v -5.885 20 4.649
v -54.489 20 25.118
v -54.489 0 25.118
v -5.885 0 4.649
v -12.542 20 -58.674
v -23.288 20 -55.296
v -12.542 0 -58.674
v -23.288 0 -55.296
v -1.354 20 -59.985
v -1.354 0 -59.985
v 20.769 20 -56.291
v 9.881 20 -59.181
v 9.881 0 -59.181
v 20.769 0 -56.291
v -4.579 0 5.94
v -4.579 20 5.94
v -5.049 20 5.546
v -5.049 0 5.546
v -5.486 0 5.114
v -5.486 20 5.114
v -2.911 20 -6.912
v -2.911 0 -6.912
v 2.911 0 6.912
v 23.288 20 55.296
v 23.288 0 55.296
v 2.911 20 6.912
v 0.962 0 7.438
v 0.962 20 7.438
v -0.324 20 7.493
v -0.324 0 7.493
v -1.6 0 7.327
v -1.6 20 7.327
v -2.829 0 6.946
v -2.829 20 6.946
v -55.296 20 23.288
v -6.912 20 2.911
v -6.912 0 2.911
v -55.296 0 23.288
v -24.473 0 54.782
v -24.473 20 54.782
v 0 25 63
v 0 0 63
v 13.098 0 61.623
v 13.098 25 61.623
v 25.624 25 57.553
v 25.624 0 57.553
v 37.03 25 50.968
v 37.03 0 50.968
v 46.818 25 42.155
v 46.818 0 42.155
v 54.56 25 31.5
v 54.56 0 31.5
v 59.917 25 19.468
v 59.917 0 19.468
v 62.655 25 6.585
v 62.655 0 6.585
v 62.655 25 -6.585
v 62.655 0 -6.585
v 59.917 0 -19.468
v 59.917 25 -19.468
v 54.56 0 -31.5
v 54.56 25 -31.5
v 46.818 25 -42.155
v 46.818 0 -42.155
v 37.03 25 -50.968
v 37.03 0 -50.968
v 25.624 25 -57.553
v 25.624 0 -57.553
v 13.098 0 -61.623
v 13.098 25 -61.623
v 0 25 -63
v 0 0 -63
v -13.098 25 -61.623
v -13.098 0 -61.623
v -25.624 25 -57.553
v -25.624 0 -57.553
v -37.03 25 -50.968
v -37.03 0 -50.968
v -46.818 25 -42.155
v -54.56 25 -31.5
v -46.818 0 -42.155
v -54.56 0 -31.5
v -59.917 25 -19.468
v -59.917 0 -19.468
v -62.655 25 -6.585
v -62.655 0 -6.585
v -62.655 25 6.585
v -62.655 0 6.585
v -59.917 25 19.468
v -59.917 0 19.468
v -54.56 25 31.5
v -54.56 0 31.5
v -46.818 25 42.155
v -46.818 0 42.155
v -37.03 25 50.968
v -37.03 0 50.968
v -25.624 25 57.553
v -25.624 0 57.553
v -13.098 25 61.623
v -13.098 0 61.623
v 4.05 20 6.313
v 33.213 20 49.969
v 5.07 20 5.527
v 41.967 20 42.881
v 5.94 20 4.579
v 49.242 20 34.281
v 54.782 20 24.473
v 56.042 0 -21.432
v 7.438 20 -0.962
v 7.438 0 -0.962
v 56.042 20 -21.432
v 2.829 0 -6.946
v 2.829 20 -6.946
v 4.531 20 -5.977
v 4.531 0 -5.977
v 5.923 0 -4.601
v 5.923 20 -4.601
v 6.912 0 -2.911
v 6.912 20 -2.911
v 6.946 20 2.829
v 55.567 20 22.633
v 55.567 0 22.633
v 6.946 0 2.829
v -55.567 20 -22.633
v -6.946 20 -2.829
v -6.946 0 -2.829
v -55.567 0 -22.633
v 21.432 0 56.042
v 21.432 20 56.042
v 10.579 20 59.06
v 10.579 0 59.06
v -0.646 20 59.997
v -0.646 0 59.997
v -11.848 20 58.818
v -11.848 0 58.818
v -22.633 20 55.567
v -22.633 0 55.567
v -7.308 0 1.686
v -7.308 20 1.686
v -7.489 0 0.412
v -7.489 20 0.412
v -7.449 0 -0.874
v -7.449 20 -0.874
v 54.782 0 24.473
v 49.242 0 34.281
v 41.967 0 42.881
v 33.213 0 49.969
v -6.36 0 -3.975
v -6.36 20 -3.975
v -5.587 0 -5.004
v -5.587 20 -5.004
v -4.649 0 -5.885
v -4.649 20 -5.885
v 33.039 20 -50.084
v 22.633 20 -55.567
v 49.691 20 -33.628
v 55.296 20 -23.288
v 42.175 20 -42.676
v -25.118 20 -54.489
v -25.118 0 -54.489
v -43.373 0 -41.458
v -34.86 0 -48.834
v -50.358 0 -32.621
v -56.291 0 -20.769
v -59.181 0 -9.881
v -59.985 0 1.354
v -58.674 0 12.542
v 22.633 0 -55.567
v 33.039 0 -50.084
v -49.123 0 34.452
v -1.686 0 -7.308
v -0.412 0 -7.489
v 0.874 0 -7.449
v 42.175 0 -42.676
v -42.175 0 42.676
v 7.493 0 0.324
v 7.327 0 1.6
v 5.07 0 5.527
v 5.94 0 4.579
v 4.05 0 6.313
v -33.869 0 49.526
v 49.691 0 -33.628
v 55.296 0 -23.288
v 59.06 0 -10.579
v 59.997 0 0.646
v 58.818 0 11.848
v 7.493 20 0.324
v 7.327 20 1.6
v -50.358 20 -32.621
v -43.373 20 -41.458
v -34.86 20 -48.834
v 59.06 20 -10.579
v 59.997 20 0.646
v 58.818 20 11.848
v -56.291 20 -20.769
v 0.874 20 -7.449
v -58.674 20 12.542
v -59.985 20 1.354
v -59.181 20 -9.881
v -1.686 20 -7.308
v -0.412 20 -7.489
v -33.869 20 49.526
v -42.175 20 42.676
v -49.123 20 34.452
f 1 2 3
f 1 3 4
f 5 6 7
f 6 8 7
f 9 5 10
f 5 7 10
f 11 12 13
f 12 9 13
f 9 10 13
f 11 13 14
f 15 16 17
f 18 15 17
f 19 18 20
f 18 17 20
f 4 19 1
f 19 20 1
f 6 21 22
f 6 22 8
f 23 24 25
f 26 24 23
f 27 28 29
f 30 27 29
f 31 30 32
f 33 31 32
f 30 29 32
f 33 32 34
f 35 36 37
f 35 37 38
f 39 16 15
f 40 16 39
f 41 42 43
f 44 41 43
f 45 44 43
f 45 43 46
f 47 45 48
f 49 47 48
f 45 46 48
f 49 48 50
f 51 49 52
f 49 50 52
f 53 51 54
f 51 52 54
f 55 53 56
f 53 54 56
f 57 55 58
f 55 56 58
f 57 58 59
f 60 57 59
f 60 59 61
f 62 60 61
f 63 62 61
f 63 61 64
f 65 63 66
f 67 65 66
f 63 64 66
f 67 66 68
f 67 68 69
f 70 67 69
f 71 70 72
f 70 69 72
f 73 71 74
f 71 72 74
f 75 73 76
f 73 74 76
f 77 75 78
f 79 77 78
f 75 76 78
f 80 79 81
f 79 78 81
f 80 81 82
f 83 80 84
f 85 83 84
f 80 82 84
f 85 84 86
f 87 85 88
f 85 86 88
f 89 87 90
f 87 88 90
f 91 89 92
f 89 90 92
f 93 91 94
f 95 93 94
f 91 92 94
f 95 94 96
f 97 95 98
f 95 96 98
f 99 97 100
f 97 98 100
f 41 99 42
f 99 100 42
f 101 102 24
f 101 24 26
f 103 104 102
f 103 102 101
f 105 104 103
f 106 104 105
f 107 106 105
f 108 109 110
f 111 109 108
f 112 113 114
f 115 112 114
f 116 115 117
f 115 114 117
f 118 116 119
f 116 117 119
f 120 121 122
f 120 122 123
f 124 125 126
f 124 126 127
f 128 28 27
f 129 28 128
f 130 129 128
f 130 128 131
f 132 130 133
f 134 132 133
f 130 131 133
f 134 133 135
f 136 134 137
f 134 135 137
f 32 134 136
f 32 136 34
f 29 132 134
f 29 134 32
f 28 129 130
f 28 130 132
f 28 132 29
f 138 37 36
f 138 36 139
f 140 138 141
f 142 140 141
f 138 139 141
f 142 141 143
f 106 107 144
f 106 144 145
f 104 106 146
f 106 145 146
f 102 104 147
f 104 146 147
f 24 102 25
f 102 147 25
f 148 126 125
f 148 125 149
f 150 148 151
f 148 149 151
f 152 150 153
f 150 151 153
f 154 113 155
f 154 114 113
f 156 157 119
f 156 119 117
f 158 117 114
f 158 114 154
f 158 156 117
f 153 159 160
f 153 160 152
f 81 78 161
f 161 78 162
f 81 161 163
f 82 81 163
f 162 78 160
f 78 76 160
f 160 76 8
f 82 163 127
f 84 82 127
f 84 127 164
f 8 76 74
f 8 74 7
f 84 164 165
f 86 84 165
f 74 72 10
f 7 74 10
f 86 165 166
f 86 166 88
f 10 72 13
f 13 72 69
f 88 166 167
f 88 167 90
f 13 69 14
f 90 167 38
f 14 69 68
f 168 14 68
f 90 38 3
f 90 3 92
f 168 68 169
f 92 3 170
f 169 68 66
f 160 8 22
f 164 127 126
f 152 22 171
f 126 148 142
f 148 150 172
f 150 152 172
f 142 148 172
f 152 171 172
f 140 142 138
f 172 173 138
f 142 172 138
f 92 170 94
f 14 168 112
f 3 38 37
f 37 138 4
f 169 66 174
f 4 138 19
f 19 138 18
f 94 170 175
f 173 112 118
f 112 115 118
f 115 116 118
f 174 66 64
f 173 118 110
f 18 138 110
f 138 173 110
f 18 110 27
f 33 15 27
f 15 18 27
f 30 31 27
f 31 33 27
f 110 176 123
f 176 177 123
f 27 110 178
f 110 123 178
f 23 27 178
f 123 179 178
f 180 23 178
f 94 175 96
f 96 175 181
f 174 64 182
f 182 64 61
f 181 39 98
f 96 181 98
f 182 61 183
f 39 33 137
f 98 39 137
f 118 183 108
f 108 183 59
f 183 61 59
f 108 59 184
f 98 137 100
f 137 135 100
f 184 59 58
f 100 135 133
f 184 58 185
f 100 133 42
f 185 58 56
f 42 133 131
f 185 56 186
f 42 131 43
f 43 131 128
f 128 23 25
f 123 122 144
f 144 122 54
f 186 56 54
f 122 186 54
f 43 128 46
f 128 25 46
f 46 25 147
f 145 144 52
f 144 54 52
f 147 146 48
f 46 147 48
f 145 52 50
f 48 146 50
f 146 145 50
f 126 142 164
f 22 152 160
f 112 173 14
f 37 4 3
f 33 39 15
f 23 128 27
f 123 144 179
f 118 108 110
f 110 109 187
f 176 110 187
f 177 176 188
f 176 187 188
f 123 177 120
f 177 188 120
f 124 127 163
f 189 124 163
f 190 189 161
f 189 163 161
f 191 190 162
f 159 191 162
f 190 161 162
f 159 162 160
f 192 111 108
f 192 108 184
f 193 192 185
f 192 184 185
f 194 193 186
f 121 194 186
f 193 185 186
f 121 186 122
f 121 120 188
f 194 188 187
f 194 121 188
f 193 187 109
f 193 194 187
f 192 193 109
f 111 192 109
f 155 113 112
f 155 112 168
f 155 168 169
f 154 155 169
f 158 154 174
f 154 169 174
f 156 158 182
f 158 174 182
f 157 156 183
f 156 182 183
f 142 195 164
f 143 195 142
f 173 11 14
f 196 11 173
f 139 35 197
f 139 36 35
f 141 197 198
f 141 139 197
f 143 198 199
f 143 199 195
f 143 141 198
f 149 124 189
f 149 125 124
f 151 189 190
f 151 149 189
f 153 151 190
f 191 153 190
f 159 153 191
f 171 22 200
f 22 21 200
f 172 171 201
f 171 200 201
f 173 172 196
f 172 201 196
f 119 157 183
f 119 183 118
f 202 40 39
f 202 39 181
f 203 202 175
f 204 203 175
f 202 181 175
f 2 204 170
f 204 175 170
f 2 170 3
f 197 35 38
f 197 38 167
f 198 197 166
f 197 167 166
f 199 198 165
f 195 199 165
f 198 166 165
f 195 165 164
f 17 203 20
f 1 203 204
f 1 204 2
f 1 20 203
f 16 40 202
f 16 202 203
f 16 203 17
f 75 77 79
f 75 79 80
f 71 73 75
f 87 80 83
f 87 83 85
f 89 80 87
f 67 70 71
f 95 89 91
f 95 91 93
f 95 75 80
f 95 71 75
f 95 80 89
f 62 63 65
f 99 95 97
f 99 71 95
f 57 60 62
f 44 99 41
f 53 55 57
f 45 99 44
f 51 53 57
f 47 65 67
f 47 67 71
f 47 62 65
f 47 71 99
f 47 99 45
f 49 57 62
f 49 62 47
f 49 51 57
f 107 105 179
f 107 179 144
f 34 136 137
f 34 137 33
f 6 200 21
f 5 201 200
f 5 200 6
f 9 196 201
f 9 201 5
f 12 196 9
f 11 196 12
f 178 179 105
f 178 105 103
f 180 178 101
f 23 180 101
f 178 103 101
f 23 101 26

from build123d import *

# Parameters (mm, degrees)
SKETCH1_R           = 63
BOSS_EXTRUDE1_DEPTH = 25
SKETCH2_R           = 60
CUT_EXTRUDE2_DEPTH  = 20
SKETCH3_R           = 7.5
BOSS_EXTRUDE2_DEPTH = 20
EXTRUDE_THIN3_DEPTH = 20


with BuildPart() as part:
    # Sketch1 → Boss-Extrude1 (new body)
    with BuildSketch(Plane(origin=(0, 0, 0), x_dir=(1, 0, 0), z_dir=(0, 1, 0))):
        with Locations(Location((0, 0, 0), (0, 0, 270))):
            Circle(SKETCH1_R)
    extrude(amount=BOSS_EXTRUDE1_DEPTH)

    # Sketch2 → Cut-Extrude2 (cut)
    with BuildSketch(Plane.XZ):
        with Locations(Location((0, 0, 0), (0, 0, 270))):
            Circle(SKETCH2_R)
    extrude(amount=-CUT_EXTRUDE2_DEPTH, mode=Mode.SUBTRACT)

    # Sketch3 → Boss-Extrude2 (add)
    with BuildSketch(Plane.XZ.offset(-20)):
        with Locations(Location((0, 0, 0), (0, 0, 270))):
            Circle(SKETCH3_R)
    extrude(amount=BOSS_EXTRUDE2_DEPTH)

    # Sketch4 → Extrude-Thin3 (add, through all)
    with BuildSketch(Plane.XZ.offset(-20)):
        Polygon((-23.273288682, 57.13837857), (23.273288682, -57.13837857), (21.421043823, -57.892824713), (-25.125533541, 56.383932427), align=None)
        Polygon((23.946234705, 56.8596352), (-23.946234705, -56.8596352), (-25.789443589, -56.083374284), (22.103025822, 57.635896117), align=None)
        Polygon((57.13837857, 23.273288682), (-57.13837857, -23.273288682), (-57.892824713, -21.421043823), (56.383932427, 25.125533541), align=None)
        Polygon((56.8596352, -23.946234705), (-56.8596352, 23.946234705), (-56.083374284, 25.789443589), (57.635896117, -22.103025822), align=None)
    extrude(amount=EXTRUDE_THIN3_DEPTH)


solid = part.part
